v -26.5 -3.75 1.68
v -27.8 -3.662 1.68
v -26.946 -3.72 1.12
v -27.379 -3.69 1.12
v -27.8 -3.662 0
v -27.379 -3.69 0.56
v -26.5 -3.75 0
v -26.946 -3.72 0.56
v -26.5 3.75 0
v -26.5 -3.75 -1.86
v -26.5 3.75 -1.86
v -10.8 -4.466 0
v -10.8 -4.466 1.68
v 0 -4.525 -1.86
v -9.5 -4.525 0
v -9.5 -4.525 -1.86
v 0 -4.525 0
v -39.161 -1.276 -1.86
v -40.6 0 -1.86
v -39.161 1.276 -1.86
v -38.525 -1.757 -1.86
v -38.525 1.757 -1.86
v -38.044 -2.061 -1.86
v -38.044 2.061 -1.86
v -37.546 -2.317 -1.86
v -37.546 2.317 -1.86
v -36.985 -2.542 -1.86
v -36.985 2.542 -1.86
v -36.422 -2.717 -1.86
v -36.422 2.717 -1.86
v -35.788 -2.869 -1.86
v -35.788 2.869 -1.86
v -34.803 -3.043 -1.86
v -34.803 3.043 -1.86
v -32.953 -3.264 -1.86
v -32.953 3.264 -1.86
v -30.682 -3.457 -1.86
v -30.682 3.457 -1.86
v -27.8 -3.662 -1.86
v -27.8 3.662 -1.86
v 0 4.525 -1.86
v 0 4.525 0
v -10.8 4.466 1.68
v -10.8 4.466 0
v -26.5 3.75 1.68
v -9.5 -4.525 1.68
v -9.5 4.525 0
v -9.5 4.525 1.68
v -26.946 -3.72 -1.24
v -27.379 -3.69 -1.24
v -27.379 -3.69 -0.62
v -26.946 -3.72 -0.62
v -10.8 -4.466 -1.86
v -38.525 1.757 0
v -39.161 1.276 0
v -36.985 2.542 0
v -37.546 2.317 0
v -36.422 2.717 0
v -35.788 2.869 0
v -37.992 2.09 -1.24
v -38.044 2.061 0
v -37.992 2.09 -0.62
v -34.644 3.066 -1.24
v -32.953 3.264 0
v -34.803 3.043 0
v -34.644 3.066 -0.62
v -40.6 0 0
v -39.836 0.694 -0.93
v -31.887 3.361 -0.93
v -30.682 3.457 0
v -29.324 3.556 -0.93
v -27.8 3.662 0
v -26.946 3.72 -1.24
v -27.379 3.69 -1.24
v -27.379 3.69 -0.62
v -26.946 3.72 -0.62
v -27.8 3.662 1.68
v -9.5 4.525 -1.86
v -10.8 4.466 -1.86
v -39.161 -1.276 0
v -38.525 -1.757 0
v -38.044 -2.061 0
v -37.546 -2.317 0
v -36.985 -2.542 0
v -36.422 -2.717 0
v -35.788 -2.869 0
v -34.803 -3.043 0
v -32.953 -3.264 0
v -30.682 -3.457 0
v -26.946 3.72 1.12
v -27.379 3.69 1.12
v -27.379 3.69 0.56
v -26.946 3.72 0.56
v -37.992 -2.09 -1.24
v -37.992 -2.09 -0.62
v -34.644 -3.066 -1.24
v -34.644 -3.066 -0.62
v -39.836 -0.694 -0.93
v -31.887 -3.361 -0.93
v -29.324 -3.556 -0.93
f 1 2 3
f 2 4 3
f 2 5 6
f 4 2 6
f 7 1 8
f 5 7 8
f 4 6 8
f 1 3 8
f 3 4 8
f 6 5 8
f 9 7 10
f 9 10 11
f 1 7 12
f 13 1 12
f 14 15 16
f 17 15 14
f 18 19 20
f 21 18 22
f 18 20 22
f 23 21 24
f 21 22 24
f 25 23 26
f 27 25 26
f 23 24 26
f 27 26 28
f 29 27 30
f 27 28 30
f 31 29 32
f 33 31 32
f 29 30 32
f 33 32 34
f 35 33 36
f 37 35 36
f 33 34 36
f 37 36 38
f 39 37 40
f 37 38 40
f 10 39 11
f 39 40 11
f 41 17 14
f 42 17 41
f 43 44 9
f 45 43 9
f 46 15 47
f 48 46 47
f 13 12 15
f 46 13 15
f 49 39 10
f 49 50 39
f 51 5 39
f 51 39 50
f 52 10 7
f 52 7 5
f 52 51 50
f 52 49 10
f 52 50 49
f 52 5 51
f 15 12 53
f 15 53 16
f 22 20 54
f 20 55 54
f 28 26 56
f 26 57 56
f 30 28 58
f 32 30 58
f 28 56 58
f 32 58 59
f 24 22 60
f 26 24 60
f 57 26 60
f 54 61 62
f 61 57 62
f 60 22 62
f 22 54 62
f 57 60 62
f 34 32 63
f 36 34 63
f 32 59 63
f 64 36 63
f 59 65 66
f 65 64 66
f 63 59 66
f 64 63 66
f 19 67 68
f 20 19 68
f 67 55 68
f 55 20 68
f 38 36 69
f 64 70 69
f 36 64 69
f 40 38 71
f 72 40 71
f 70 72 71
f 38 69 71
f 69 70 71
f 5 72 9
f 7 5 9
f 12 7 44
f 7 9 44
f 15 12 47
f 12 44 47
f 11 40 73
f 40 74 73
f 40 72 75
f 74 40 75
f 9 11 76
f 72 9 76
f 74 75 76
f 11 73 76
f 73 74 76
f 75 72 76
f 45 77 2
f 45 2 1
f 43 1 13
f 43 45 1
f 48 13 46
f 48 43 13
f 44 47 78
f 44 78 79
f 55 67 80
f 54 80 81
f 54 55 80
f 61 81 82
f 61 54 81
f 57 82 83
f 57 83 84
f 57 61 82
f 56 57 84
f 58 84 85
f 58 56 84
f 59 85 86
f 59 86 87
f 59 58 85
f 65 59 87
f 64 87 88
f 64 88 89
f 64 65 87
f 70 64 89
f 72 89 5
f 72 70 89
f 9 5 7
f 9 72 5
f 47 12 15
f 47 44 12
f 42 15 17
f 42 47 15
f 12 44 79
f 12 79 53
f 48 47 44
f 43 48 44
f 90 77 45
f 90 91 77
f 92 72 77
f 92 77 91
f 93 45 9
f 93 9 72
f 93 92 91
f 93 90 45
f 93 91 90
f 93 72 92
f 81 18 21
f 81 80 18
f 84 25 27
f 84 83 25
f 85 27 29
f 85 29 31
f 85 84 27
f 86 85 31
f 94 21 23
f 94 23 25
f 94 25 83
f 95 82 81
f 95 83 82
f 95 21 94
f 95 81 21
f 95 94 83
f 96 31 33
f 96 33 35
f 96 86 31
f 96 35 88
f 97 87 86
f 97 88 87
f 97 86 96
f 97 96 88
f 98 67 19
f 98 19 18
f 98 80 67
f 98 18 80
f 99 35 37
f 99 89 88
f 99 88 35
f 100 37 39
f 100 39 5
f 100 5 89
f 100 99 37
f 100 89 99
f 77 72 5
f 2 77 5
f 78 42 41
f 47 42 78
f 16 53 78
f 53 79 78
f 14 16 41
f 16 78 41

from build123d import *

# Parameters (mm, degrees)
F1_DEPTH = 1.86
F2_DEPTH = 1.68


with BuildPart() as f1:
    # F0 (on Top) → F1 (new body)
    with BuildSketch(Plane.XY):
        Polygon((-9.5, 4.525), (-9.5, 0), (-9.5, -4.525), (0, -4.525), (0, 0), (0, 4.525), align=None)
        Polygon((-9.5, -4.525), (-9.5, 0), (-10.8, 0), (-10.8, -4.465735), align=None)
        with BuildLine():
            Line((-27.8, 0), (-26.5, 0))
            Line((-26.5, 0), (-26.5, 3.75))
            add(Edge.make_bspline(
                [(-27.8, 3.661657), (-27.384877, 3.690006), (-26.951887, 3.719363), (-26.5, 3.75)],
                knots=[13.98, 13.98, 13.98, 13.98, 14.590151, 14.590151, 14.590151, 14.590151], degree=3))
            Line((-27.8, 3.661657), (-27.8, 0))
        make_face()
        with BuildLine():
            Line((-26.5, -3.75), (-26.5, 0))
            Line((-26.5, 0), (-27.8, 0))
            Line((-27.8, 0), (-27.8, -3.661657))
            add(Edge.make_bspline(
                [(-27.8, -3.661657), (-27.384877, -3.690006), (-26.951887, -3.719363), (-26.5, -3.75)],
                knots=[13.98, 13.98, 13.98, 13.98, 14.590151, 14.590151, 14.590151, 14.590151], degree=3))
        make_face()
        with BuildLine():
            Line((-27.8, -3.661657), (-27.8, 0))
            Line((-27.8, 0), (-40.6, 0))
            add(Edge.make_bspline(
                [(-40.6, 0), (-37.443453, -2.891201), (-37.311448, -3.01211), (-27.8, -3.661657)],
                knots=[0, 0, 0, 0, 13.98, 13.98, 13.98, 13.98], degree=3))
        make_face()
        with BuildLine():
            Line((-40.6, 0), (-27.8, 0))
            Line((-27.8, 0), (-27.8, 3.661657))
            add(Edge.make_bspline(
                [(-40.6, 0), (-37.443453, 2.891201), (-37.311448, 3.01211), (-27.8, 3.661657)],
                knots=[0, 0, 0, 0, 13.98, 13.98, 13.98, 13.98], degree=3))
        make_face()
        Polygon((-10.8, 0), (-9.5, 0), (-9.5, 4.525), (-10.8, 4.465735), align=None)
    extrude(amount=-F1_DEPTH)


with BuildPart() as f2:
    # F0 (on Top) → F2 (new body)
    with BuildSketch(Plane.XY):
        with BuildLine():
            Line((-27.8, 0), (-26.5, 0))
            Line((-26.5, 0), (-26.5, 3.75))
            add(Edge.make_bspline(
                [(-27.8, 3.661657), (-27.384877, 3.690006), (-26.951887, 3.719363), (-26.5, 3.75)],
                knots=[13.98, 13.98, 13.98, 13.98, 14.590151, 14.590151, 14.590151, 14.590151], degree=3))
            Line((-27.8, 3.661657), (-27.8, 0))
        make_face()
        with BuildLine():
            Line((-26.5, -3.75), (-26.5, 0))
            Line((-26.5, 0), (-27.8, 0))
            Line((-27.8, 0), (-27.8, -3.661657))
            add(Edge.make_bspline(
                [(-27.8, -3.661657), (-27.384877, -3.690006), (-26.951887, -3.719363), (-26.5, -3.75)],
                knots=[13.98, 13.98, 13.98, 13.98, 14.590151, 14.590151, 14.590151, 14.590151], degree=3))
        make_face()
        Polygon((-10.8, -4.465735), (-10.8, 0), (-26.5, 0), (-26.5, -3.75), align=None)
        Polygon((-26.5, 0), (-10.8, 0), (-10.8, 4.465735), (-26.5, 3.75), align=None)
        Polygon((-10.8, 0), (-9.5, 0), (-9.5, 4.525), (-10.8, 4.465735), align=None)
        Polygon((-9.5, -4.525), (-9.5, 0), (-10.8, 0), (-10.8, -4.465735), align=None)
    extrude(amount=F2_DEPTH)


solid = Compound([f1.part, f2.part])
